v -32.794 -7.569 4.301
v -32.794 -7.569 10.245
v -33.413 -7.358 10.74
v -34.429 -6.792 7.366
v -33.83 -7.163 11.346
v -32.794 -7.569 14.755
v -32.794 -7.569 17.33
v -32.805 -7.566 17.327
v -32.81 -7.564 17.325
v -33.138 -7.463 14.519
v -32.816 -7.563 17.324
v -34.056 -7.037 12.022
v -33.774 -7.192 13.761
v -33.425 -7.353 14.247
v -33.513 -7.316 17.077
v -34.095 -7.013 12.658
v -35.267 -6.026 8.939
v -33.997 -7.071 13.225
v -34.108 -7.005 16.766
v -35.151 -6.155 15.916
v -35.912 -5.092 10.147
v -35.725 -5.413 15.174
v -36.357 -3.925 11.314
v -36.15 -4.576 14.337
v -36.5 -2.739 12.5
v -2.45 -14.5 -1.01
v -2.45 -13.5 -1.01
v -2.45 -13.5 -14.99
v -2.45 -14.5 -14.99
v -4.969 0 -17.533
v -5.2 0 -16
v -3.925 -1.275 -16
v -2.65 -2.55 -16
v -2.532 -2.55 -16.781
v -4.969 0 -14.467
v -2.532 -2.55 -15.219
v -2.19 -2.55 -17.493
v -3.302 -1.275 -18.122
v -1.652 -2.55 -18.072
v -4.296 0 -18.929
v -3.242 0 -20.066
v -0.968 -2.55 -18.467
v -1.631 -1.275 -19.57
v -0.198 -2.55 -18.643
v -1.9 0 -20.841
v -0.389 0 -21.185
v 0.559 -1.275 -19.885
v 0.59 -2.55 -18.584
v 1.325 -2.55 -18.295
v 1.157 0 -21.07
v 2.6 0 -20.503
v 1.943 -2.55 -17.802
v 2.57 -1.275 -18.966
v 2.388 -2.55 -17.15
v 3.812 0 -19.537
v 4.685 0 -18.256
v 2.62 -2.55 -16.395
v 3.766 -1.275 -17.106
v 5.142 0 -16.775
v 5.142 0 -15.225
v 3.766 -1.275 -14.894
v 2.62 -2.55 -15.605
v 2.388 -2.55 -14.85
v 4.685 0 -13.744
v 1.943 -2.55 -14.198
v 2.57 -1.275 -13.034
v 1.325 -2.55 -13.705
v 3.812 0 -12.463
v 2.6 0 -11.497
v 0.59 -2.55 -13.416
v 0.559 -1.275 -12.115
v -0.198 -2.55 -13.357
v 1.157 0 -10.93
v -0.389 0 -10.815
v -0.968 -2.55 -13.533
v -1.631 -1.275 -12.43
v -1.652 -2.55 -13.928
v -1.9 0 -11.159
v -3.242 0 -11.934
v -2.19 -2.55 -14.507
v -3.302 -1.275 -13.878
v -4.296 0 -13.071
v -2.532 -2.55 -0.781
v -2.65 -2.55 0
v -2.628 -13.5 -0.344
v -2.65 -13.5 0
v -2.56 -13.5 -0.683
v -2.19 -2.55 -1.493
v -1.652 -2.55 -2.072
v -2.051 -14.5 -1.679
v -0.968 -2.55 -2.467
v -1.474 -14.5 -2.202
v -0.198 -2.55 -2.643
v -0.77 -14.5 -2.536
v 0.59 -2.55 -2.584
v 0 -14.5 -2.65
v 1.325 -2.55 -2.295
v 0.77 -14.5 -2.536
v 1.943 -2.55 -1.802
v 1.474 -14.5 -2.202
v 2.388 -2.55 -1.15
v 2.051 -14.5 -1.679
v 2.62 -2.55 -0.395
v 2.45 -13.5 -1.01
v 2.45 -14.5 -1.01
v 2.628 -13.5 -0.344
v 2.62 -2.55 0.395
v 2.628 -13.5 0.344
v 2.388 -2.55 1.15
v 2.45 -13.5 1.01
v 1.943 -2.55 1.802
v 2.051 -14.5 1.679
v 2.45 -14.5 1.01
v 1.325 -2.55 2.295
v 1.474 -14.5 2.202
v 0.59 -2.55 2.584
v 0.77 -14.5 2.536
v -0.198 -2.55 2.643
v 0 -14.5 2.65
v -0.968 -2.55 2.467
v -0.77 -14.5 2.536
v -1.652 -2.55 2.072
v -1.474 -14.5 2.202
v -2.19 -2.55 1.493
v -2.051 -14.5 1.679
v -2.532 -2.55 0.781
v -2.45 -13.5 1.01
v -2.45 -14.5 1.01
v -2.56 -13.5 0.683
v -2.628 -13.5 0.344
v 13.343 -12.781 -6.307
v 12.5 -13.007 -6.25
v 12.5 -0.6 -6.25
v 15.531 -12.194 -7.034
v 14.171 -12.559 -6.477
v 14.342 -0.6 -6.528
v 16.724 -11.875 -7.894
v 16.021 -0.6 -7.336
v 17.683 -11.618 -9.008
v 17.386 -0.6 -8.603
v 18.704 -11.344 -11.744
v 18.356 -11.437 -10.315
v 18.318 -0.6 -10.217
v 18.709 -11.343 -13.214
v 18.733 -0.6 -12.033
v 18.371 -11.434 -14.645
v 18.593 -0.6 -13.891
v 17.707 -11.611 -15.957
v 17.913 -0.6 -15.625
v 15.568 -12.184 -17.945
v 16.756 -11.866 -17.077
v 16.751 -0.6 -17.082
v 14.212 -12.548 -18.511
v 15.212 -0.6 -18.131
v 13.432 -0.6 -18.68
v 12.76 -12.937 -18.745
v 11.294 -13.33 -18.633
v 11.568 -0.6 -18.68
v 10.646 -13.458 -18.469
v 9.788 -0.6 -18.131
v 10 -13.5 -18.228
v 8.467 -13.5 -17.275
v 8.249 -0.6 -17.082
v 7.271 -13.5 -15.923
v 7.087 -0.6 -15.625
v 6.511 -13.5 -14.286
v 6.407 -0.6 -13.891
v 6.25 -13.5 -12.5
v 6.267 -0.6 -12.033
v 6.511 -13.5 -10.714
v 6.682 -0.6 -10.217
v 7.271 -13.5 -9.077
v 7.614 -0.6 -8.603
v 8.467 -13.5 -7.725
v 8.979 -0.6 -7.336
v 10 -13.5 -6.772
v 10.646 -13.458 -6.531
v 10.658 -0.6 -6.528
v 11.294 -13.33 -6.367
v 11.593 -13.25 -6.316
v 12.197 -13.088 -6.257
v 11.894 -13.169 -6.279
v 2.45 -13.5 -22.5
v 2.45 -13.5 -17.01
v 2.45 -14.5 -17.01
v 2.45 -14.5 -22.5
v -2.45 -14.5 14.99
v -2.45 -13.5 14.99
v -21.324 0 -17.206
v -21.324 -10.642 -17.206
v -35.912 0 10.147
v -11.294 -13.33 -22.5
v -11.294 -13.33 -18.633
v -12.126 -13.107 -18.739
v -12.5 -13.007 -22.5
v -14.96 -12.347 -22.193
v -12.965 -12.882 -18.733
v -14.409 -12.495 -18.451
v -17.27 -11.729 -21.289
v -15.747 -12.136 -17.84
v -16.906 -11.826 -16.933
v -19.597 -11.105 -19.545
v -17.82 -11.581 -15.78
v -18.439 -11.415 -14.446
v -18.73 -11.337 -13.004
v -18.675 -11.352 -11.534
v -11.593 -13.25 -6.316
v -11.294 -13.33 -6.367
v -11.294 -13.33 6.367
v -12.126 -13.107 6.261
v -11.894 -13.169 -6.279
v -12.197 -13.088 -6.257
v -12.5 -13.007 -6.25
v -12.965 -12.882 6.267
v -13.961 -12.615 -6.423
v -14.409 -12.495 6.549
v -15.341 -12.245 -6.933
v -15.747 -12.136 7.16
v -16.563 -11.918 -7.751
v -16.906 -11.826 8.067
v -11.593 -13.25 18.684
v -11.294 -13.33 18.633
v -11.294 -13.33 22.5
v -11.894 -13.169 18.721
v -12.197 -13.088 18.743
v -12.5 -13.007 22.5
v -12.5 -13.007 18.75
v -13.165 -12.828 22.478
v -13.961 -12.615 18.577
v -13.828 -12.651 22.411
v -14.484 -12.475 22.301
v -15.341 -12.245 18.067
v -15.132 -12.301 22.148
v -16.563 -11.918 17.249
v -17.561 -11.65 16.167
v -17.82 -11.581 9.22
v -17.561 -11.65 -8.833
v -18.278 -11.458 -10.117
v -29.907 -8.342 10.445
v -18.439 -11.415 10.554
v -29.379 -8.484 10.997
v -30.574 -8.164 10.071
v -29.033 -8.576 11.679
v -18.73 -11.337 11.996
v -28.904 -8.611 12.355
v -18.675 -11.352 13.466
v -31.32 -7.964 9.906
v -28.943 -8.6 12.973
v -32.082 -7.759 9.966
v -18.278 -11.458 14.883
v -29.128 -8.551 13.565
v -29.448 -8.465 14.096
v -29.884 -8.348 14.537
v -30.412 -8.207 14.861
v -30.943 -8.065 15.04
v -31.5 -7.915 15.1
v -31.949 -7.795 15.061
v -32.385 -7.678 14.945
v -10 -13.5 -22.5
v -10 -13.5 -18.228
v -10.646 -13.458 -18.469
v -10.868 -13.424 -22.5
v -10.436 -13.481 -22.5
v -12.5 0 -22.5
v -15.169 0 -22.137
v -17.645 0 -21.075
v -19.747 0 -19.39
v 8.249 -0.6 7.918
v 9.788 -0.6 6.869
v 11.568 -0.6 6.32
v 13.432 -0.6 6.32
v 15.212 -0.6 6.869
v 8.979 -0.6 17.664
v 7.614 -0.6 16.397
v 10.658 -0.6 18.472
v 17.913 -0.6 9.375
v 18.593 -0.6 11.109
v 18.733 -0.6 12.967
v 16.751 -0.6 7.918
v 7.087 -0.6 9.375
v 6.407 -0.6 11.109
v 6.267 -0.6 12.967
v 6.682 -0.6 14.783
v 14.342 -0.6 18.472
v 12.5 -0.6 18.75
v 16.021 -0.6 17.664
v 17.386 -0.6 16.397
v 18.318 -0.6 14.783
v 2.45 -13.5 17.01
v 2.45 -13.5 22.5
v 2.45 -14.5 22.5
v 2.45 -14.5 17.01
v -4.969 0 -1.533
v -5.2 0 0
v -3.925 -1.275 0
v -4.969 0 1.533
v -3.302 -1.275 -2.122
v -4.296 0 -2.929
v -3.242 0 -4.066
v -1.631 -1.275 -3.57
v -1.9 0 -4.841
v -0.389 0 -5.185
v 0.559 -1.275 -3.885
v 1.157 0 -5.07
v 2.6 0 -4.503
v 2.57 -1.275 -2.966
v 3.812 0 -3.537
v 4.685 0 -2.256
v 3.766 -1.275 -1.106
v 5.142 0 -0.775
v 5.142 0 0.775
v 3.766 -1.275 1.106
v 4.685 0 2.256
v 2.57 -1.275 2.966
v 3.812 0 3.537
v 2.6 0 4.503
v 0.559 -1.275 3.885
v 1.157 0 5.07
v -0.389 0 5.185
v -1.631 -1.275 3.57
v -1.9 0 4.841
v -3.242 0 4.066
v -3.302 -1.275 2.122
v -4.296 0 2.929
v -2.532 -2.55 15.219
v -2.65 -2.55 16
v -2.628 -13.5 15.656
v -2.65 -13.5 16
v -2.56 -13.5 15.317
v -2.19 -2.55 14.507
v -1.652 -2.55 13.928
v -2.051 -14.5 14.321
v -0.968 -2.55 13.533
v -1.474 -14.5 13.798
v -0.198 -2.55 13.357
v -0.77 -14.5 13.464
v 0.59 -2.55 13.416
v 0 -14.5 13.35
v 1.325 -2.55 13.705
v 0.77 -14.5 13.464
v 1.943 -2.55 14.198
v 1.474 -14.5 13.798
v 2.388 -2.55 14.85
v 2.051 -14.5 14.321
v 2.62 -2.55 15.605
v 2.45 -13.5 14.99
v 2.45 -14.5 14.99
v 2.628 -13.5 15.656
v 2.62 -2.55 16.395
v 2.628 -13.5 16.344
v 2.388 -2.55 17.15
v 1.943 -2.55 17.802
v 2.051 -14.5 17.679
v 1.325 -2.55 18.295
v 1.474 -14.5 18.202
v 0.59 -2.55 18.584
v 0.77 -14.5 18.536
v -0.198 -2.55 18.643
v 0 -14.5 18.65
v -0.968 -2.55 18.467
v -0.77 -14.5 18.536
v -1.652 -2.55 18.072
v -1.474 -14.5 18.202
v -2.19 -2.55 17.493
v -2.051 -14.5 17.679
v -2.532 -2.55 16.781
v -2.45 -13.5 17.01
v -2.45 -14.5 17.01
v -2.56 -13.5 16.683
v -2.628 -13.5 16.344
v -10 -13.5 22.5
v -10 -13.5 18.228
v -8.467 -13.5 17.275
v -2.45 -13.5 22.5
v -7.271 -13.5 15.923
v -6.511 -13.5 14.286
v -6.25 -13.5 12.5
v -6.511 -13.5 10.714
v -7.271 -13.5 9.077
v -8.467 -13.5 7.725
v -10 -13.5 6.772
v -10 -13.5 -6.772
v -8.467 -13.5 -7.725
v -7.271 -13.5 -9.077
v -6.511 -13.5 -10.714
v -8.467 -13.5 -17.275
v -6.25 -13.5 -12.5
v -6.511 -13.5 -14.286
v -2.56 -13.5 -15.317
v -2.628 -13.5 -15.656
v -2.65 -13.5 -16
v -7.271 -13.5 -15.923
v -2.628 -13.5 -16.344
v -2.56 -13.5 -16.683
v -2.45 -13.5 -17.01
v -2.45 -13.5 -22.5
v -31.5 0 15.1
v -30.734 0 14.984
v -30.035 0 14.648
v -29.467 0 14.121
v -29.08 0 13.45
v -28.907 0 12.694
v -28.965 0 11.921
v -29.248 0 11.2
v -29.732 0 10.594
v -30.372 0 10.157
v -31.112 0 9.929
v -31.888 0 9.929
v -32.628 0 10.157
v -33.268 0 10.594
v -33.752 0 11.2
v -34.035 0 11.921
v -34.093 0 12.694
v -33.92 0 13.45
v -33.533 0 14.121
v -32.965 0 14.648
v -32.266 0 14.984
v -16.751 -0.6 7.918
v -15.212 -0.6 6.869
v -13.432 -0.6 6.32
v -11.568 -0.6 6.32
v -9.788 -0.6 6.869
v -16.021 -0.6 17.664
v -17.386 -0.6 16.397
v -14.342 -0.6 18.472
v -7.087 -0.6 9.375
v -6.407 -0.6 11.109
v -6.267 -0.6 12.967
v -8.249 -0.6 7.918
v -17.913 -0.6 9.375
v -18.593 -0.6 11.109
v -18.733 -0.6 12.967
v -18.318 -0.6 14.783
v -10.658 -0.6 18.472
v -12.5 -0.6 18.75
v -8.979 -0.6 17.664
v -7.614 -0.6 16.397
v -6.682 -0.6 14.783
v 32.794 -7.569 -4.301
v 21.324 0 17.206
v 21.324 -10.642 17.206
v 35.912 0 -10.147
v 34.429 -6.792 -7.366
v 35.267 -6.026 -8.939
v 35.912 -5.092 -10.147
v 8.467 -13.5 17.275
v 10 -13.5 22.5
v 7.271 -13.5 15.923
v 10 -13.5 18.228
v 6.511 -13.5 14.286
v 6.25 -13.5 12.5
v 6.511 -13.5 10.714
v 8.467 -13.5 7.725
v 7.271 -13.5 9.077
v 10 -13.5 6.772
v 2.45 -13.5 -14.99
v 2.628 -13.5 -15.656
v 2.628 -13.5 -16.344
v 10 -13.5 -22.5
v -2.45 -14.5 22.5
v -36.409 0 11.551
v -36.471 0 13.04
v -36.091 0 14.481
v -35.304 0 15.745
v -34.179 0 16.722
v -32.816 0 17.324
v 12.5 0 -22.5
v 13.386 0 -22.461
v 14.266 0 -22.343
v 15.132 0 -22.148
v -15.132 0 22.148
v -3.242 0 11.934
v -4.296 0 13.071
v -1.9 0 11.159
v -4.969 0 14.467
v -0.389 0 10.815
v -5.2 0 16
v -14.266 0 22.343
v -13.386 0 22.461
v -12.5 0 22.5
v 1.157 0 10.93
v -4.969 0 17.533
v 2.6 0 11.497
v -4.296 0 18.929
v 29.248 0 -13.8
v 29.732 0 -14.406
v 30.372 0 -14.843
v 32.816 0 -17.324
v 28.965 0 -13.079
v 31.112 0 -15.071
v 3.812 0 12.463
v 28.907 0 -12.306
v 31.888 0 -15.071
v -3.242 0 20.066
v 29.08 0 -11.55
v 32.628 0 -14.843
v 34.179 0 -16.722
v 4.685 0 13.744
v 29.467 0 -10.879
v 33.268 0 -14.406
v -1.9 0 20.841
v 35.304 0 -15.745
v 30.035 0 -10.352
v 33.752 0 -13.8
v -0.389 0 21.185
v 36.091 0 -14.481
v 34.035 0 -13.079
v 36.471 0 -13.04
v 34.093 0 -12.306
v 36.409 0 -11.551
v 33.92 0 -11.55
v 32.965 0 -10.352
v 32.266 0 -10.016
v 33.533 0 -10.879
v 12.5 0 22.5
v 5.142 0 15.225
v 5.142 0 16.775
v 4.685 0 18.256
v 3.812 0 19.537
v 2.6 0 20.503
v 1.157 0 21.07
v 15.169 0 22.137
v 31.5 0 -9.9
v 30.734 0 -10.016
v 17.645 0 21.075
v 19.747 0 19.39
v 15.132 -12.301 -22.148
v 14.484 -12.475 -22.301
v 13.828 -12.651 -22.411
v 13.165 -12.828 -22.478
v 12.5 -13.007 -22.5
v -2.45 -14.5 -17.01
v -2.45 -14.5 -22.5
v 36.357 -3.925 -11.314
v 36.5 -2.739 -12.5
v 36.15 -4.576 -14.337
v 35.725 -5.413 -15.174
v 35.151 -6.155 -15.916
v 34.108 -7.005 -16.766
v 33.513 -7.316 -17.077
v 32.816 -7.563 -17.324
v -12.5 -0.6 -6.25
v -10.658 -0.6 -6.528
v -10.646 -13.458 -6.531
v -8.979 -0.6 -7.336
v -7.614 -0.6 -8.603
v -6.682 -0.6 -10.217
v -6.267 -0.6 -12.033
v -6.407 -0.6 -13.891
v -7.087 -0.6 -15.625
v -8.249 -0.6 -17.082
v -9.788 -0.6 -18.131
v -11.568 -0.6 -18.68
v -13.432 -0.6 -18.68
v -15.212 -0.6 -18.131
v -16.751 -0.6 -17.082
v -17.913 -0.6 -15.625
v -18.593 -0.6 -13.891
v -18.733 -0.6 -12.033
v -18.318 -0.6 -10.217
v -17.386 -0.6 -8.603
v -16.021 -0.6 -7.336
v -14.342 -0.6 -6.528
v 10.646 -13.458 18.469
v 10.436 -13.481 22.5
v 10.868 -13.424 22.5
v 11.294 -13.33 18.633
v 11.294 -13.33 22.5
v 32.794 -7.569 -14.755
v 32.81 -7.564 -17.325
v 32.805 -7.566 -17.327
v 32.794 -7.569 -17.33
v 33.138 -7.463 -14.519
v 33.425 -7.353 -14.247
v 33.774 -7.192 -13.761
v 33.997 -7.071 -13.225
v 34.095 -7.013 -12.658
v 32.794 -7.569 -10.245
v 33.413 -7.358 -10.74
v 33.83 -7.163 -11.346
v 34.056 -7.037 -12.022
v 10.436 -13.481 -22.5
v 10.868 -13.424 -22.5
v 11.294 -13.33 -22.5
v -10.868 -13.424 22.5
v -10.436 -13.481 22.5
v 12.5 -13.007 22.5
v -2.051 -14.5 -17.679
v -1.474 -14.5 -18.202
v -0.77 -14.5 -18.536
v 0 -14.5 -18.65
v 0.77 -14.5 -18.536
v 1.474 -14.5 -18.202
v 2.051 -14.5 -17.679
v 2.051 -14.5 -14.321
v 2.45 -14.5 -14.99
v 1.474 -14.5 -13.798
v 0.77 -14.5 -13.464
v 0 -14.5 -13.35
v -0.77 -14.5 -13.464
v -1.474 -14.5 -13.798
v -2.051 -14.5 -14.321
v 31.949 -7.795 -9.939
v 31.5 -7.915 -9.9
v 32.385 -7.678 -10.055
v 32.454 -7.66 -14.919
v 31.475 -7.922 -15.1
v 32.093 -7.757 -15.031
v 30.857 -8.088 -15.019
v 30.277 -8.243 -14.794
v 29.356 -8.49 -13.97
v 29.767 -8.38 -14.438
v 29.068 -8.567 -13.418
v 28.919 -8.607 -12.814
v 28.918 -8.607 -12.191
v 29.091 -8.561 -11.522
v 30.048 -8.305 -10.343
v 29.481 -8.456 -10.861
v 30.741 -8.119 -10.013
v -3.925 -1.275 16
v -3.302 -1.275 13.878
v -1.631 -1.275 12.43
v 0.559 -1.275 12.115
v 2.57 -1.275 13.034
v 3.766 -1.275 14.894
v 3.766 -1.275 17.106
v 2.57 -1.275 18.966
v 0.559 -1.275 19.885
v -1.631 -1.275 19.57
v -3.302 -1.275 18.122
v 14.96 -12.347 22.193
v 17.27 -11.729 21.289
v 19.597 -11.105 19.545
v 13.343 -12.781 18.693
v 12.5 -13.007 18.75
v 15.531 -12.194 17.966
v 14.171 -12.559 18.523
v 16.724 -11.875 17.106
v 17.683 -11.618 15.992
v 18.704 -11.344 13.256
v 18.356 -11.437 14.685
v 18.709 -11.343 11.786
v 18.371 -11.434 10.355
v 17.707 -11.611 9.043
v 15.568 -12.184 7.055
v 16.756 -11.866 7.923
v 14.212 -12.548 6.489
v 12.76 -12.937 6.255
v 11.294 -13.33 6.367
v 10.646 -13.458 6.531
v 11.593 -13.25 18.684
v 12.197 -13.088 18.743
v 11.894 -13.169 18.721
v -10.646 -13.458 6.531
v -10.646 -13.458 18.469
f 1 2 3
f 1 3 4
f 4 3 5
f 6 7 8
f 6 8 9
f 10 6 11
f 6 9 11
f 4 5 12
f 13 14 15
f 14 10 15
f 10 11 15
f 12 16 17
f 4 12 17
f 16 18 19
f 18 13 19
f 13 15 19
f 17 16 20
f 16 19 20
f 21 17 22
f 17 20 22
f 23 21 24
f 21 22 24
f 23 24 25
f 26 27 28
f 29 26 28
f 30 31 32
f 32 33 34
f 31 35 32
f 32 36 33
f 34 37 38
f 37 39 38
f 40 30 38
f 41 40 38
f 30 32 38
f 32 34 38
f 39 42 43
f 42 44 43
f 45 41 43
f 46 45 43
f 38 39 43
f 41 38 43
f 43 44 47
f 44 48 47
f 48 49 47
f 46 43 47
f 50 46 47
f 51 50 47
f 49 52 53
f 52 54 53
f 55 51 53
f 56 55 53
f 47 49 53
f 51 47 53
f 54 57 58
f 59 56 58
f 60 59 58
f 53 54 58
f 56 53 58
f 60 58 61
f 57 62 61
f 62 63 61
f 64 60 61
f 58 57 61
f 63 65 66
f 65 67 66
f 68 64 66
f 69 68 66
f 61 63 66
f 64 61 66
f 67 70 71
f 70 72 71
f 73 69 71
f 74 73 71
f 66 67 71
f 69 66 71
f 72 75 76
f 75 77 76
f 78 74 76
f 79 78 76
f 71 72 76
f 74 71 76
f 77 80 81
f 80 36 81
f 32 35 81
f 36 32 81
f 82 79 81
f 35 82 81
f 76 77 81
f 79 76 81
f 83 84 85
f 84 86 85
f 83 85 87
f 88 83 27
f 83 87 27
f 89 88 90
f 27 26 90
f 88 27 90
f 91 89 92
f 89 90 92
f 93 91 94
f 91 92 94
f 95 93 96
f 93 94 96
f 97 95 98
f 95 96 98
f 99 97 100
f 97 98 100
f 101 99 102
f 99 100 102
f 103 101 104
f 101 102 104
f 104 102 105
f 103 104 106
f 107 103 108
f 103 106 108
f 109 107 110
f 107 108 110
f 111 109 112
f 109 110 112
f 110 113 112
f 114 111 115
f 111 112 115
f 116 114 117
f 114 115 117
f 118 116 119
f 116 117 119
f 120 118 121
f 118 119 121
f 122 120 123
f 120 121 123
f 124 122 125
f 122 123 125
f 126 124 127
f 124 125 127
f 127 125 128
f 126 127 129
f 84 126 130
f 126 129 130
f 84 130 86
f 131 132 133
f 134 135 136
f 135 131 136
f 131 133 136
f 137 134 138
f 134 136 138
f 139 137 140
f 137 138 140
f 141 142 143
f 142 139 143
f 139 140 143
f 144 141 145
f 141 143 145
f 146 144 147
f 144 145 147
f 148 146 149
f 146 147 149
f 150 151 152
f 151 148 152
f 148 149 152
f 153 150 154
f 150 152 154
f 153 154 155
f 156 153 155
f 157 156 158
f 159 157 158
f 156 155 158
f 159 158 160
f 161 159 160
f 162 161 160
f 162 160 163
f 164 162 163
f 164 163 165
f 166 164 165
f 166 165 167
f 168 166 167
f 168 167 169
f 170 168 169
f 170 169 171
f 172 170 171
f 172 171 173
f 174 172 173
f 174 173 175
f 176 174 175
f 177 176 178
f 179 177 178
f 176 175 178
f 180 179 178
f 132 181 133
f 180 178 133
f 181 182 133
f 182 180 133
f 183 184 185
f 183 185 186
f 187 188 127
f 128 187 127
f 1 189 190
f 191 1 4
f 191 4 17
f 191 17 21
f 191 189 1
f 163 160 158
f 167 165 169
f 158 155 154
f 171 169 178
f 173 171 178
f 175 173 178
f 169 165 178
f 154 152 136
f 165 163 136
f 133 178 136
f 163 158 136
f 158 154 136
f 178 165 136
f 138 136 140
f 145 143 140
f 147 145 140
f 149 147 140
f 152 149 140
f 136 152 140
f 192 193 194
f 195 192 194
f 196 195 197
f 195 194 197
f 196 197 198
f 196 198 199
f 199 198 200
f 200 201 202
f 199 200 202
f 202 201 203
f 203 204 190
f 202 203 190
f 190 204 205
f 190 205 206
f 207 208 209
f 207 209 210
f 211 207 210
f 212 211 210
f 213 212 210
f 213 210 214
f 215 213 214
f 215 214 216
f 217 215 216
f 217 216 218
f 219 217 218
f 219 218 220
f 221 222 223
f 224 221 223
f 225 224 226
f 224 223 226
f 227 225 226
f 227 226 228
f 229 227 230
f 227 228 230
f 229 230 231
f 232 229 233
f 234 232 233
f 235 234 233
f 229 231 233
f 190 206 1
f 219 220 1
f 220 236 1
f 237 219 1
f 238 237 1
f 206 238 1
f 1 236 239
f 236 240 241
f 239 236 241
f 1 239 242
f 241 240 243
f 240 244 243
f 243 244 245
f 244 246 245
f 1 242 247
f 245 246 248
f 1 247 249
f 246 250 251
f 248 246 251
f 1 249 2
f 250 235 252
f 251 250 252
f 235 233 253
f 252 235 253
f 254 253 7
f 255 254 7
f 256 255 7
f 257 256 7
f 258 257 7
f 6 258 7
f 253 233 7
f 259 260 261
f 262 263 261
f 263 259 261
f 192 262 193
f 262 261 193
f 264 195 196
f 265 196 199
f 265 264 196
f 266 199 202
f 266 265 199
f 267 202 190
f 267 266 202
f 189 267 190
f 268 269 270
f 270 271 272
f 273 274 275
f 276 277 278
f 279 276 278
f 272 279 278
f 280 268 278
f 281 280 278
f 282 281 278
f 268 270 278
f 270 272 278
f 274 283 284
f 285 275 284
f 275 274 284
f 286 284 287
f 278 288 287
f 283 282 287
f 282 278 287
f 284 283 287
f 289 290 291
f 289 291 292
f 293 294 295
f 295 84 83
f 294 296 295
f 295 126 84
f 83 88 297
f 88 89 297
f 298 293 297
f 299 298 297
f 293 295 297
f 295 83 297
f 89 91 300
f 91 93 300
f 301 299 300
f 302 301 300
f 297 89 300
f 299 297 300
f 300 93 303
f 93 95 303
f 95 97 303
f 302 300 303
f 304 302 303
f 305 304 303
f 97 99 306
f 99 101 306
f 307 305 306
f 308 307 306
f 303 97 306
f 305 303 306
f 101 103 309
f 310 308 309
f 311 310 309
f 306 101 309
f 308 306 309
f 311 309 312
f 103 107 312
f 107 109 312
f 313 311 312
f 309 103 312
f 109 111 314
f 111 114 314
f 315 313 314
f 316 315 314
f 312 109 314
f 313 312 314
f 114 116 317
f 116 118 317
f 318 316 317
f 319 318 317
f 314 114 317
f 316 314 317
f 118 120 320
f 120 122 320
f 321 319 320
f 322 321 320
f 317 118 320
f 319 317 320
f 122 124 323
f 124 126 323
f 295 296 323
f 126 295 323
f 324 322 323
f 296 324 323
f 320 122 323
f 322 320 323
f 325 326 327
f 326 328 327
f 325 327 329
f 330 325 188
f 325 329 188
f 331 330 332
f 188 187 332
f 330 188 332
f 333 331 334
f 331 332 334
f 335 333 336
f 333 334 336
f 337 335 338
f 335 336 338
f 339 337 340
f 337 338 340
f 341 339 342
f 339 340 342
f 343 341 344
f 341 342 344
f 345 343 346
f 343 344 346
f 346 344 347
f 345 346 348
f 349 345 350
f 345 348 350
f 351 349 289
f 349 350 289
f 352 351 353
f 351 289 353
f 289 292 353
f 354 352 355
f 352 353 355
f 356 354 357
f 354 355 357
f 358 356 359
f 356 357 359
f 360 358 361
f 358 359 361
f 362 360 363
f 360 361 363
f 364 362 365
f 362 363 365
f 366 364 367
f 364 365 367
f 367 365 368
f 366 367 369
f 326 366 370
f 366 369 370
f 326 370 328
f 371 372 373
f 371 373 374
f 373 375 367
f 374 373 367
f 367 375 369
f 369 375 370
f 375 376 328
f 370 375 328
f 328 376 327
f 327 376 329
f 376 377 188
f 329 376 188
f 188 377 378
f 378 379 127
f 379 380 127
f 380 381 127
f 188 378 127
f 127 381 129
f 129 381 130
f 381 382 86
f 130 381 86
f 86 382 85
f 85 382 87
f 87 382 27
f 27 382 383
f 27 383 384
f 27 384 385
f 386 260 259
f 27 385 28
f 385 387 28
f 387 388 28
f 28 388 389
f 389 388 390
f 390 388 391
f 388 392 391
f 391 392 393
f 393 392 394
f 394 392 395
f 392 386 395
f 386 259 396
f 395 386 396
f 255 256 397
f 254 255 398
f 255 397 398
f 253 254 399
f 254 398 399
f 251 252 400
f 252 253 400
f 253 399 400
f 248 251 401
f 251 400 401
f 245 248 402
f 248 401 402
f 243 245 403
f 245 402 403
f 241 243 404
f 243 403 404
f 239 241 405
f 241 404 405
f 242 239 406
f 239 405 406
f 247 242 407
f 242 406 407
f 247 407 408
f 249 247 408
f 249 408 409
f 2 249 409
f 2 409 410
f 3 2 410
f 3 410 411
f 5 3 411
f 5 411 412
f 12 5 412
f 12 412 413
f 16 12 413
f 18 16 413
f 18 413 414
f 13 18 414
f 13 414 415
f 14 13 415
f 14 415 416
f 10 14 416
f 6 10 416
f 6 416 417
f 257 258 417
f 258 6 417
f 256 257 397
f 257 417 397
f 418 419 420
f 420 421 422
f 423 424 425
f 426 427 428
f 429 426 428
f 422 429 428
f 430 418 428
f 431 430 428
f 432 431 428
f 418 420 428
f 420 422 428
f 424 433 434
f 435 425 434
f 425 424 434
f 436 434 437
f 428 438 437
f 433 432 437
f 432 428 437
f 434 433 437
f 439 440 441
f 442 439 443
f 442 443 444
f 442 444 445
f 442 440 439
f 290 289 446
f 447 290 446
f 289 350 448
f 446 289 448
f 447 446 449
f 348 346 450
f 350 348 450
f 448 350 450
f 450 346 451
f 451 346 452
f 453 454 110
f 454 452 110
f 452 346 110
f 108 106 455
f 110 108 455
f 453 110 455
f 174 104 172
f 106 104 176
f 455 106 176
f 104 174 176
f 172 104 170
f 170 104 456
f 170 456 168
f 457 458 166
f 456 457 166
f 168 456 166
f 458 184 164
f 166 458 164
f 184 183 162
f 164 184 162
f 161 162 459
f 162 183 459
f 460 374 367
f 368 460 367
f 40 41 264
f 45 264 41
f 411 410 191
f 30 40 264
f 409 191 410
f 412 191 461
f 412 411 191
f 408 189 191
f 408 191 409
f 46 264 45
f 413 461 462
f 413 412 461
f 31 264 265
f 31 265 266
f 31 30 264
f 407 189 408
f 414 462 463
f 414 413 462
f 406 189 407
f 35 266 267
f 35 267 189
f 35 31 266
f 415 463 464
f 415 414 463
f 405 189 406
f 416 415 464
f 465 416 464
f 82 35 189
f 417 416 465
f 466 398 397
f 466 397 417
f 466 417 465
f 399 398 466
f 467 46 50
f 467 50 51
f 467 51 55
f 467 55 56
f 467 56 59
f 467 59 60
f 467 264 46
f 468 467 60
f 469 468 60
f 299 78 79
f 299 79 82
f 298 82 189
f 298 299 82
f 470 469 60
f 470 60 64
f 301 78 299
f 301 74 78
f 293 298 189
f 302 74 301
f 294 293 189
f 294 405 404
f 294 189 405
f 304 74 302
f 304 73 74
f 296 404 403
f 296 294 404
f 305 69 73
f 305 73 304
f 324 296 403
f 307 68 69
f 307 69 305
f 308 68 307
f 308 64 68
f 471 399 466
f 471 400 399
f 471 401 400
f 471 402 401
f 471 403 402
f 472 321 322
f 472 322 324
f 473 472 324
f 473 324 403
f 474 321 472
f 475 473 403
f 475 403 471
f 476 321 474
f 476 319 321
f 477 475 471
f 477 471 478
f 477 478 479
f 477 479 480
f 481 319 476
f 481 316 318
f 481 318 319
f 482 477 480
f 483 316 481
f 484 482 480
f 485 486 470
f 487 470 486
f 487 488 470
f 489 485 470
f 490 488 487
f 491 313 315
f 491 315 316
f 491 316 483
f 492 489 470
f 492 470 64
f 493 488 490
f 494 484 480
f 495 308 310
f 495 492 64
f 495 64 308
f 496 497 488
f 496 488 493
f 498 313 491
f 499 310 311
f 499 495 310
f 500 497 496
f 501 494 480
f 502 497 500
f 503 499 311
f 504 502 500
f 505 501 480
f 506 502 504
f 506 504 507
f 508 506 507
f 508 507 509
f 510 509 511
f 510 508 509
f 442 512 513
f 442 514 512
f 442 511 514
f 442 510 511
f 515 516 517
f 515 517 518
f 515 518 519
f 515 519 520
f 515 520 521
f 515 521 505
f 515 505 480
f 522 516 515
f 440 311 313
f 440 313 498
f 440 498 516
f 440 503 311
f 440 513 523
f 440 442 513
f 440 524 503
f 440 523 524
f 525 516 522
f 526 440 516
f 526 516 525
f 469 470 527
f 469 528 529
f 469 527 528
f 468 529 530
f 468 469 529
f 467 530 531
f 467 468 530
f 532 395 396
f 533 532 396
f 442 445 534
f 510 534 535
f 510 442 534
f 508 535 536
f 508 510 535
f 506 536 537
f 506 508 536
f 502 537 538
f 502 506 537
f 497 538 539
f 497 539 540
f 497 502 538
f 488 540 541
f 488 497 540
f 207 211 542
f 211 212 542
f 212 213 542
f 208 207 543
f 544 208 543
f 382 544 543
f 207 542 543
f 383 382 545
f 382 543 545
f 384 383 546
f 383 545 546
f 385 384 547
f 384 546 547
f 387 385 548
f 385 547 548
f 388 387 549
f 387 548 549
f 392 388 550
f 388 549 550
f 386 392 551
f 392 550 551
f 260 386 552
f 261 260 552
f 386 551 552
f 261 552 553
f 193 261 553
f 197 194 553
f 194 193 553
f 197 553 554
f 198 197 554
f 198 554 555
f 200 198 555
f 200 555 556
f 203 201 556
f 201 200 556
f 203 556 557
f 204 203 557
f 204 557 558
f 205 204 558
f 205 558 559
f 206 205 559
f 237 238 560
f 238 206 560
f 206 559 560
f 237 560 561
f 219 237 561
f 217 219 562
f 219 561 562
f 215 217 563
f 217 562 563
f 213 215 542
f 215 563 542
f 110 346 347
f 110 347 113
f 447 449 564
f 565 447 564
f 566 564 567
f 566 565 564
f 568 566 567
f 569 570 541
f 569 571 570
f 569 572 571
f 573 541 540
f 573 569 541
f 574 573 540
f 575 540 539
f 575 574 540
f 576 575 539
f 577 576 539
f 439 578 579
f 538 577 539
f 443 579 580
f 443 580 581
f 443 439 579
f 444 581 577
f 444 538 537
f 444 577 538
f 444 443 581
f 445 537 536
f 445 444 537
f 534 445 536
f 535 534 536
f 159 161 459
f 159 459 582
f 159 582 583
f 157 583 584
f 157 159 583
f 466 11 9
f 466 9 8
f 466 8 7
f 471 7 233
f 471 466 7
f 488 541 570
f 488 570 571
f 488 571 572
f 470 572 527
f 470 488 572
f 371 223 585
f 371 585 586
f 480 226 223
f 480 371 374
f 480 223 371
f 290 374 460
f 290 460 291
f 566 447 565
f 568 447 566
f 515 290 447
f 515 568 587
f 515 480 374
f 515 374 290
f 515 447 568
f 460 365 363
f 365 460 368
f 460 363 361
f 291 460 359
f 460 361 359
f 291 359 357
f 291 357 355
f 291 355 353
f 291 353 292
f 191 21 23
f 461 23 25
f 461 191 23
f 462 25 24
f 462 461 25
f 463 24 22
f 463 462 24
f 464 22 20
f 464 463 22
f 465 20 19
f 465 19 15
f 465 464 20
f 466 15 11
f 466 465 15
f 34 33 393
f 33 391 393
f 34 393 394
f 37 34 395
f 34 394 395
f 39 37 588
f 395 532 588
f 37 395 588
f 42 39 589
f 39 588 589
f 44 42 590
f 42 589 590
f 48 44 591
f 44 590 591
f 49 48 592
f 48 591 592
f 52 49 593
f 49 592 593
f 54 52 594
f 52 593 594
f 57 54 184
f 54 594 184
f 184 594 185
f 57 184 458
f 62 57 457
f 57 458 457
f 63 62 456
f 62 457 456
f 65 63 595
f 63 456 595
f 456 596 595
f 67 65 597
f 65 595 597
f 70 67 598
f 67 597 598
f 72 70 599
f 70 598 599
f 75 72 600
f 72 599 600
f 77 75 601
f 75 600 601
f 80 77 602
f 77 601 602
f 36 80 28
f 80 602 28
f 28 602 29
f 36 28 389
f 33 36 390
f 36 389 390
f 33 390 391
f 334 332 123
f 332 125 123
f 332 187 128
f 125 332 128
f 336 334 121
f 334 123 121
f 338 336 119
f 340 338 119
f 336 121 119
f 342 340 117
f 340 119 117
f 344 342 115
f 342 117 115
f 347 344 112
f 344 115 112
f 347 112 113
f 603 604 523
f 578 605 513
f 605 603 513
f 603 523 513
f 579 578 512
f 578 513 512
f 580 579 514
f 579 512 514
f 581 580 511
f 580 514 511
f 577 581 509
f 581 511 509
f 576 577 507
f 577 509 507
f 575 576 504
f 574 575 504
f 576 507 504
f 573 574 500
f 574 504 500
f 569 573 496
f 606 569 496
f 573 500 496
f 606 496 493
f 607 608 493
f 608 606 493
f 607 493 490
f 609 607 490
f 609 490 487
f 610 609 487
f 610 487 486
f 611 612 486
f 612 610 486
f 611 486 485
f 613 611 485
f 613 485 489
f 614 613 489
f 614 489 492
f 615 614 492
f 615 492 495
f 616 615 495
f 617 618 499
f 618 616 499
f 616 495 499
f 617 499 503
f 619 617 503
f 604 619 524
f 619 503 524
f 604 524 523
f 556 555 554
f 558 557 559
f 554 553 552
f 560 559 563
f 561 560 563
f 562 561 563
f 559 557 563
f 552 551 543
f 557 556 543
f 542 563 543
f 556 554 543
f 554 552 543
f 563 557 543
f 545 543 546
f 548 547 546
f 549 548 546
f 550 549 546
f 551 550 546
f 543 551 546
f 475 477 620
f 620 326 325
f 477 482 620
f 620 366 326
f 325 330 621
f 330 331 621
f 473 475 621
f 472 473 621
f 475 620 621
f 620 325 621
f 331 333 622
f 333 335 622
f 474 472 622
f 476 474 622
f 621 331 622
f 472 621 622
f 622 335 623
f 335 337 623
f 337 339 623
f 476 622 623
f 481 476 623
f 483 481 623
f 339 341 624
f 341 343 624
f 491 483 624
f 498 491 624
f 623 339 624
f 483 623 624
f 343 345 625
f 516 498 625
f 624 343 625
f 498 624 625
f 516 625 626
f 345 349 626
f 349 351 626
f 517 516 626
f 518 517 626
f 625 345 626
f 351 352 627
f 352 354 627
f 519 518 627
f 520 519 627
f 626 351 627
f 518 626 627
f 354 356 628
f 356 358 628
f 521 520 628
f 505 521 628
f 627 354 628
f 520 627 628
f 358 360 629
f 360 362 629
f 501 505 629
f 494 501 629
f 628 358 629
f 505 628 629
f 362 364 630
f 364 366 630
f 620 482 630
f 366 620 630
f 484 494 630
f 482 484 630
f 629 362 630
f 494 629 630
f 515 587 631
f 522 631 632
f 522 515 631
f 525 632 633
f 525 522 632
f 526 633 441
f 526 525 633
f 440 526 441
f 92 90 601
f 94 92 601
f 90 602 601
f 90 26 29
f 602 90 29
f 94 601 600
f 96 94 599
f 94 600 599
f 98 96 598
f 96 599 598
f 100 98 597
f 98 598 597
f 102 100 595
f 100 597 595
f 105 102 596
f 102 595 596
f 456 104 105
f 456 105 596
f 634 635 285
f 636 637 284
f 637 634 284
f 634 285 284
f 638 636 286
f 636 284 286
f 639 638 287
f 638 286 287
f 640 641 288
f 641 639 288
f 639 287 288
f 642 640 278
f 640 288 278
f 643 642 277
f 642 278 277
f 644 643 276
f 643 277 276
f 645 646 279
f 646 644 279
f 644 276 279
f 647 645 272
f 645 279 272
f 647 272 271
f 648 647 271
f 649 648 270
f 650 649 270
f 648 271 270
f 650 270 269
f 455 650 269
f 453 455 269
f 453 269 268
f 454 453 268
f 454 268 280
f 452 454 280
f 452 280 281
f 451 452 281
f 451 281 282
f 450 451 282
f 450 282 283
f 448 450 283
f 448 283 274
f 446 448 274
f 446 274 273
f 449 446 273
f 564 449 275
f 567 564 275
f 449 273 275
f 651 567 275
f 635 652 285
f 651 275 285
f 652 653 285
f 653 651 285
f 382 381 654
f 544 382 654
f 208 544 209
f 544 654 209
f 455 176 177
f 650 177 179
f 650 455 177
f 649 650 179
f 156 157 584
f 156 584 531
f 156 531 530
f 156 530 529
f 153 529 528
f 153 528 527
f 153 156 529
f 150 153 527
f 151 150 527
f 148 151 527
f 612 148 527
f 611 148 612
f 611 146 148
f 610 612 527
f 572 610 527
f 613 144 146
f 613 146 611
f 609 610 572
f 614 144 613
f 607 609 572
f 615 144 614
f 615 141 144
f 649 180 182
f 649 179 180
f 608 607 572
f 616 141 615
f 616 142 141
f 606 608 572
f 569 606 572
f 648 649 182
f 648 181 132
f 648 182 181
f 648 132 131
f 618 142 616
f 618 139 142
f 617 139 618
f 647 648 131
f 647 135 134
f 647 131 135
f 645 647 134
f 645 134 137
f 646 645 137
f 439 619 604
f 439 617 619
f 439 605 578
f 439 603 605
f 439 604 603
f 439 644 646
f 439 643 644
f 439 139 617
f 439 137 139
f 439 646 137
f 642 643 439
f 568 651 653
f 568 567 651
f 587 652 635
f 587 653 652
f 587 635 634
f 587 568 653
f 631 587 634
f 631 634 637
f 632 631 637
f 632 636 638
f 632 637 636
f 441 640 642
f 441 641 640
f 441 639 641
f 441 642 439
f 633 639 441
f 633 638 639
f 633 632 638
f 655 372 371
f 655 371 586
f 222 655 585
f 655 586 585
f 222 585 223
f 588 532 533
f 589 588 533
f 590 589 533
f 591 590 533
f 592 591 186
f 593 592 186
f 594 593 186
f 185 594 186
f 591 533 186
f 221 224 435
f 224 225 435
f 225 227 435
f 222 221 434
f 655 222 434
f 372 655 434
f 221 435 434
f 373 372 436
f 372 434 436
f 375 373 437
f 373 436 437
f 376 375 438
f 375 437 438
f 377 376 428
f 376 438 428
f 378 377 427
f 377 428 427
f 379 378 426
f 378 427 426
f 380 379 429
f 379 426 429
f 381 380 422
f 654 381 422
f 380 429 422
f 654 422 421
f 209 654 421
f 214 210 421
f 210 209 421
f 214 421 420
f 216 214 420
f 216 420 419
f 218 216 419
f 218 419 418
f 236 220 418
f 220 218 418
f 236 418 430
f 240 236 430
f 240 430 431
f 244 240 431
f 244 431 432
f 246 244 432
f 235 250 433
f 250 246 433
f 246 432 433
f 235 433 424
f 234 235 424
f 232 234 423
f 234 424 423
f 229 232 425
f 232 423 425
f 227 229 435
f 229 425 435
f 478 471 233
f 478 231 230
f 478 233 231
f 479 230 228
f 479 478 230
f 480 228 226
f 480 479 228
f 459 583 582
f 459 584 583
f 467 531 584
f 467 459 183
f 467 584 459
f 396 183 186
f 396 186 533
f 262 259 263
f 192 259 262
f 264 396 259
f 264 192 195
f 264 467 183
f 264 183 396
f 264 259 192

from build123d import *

# Parameters (mm, degrees)
SKETCH1_R                                       = 2.6
SKETCH1_R_2                                     = 6.25
SKETCH1_W                                       = 4.9
SKETCH1_H                                       = 45
BOSS_EXTRUDE1_DEPTH                             = 13.5
SKETCH1_3_R                                     = 6.25
BOSS_EXTRUDE2_DEPTH                             = 0.6
BOSS_EXTRUDE3_START                             = -13.5
SKETCH1_4_W                                     = 4.9
SKETCH1_4_H                                     = 45
BOSS_EXTRUDE3_DEPTH                             = 1
CSK_FOR_M5_FLAT_HEAD_MACHINE_SCREW2_D           = 5.3
CSK_FOR_M5_FLAT_HEAD_MACHINE_SCREW2_CSINK_D     = 10.4
CSK_FOR_M5_FLAT_HEAD_MACHINE_SCREW2_CSINK_ANGLE = 90
CUT_EXTRUDE1_DEPTH                              = 46.263119645


with BuildPart() as part:
    # Sketch1 → Boss-Extrude1 (new body)
    # profile 1 of 3: a face of its own
    with BuildSketch(Plane(origin=(0, 0, 0), x_dir=(1, 0, 0), z_dir=(0, 1, 0))):
        with BuildLine():
            Line((-2.45, 22.5), (-12.5, 22.5))
            ThreePointArc((-12.5, 22.5), (-17.644957554, 21.074929257), (-21.323529412, 17.205882353))
            Line((-21.323529412, 17.205882353), (-35.911764706, -10.147058824))
            ThreePointArc((-35.911764706, -10.147058824), (-36.091023102, -14.480531969), (-32.815789474, -17.323763889))
            Line((-32.815789474, -17.323763889), (-15.131578947, -22.147527779))
            ThreePointArc((-15.131578947, -22.147527779), (-13.827539493, -22.411490246), (-12.5, -22.5))
            Line((-12.5, -22.5), (-2.45, -22.5))
            Line((-2.45, -22.5), (-2.45, 22.5))
        make_face()
        with Locations(Location((-31.5, -12.5, 0), (0, 0, 270))):
            Circle(SKETCH1_R, mode=Mode.SUBTRACT)
        with Locations(Location((-12.5, -12.5, 0), (0, 0, 270))):
            Circle(SKETCH1_R_2, mode=Mode.SUBTRACT)
        with Locations(Location((-12.5, 12.5, 0), (0, 0, 270))):
            Circle(SKETCH1_R_2, mode=Mode.SUBTRACT)
    # profile 2 of 3: a face of its own
    with BuildSketch(Plane(origin=(0, 0, 0), x_dir=(1, 0, 0), z_dir=(0, 1, 0))):
        Rectangle(SKETCH1_W, SKETCH1_H)
    # profile 3 of 3: a face of its own
    with BuildSketch(Plane(origin=(0, 0, 0), x_dir=(1, 0, 0), z_dir=(0, 1, 0))):
        with BuildLine():
            Line((12.5, 22.5), (2.45, 22.5))
            Line((2.45, 22.5), (2.45, -22.5))
            Line((2.45, -22.5), (12.5, -22.5))
            ThreePointArc((12.5, -22.5), (17.644957554, -21.074929257), (21.323529412, -17.205882353))
            Line((21.323529412, -17.205882353), (35.911764706, 10.147058824))
            ThreePointArc((35.911764706, 10.147058824), (36.091023102, 14.480531969), (32.815789474, 17.323763889))
            Line((32.815789474, 17.323763889), (15.131578947, 22.147527779))
            ThreePointArc((15.131578947, 22.147527779), (13.827539493, 22.411490246), (12.5, 22.5))
        make_face()
        with Locations(Location((12.5, -12.5, 0), (0, 0, 270))):
            Circle(SKETCH1_R_2, mode=Mode.SUBTRACT)
        with Locations(Location((12.5, 12.5, 0), (0, 0, 270))):
            Circle(SKETCH1_R_2, mode=Mode.SUBTRACT)
        with Locations(Location((31.5, 12.5, 0), (0, 0, 270))):
            Circle(SKETCH1_R, mode=Mode.SUBTRACT)
    extrude(amount=-BOSS_EXTRUDE1_DEPTH)

    # Sketch1<3> → Boss-Extrude2 (add)
    with BuildSketch(Plane(origin=(0, 0, 0), x_dir=(1, 0, 0), z_dir=(0, 1, 0))):
        with Locations(Location((-12.5, 12.5, 0), (0, 0, 270))):
            Circle(SKETCH1_3_R)
        with Locations(Location((12.5, 12.5, 0), (0, 0, 270))):
            Circle(SKETCH1_3_R)
        with Locations(Location((12.5, -12.5, 0), (0, 0, 270))):
            Circle(SKETCH1_3_R)
        with Locations(Location((-12.5, -12.5, 0), (0, 0, 270))):
            Circle(SKETCH1_3_R)
    extrude(amount=-BOSS_EXTRUDE2_DEPTH)

    # Sketch1<4> → Boss-Extrude3 (add)
    with BuildSketch(Plane(origin=(0, 0, 0), x_dir=(1, 0, 0), z_dir=(0, 1, 0)).offset(BOSS_EXTRUDE3_START)):
        Rectangle(SKETCH1_4_W, SKETCH1_4_H)
    extrude(amount=-BOSS_EXTRUDE3_DEPTH)

    # CSK for M5 Flat Head Machine Screw2 (through all)
    with Locations(Plane(origin=(0, 0, 0), x_dir=(1, 0, 0), z_dir=(0, 1, 0))):
        with Locations((0, 16), (0, 0), (0, -16)):
            CounterSinkHole(CSK_FOR_M5_FLAT_HEAD_MACHINE_SCREW2_D / 2, CSK_FOR_M5_FLAT_HEAD_MACHINE_SCREW2_CSINK_D / 2, counter_sink_angle=CSK_FOR_M5_FLAT_HEAD_MACHINE_SCREW2_CSINK_ANGLE)

    # Sketch8 → Cut-Extrude1 (cut, symmetric)
    with BuildSketch(Plane.XY):
        with BuildLine():
            ThreePointArc((32.794095226, -7.568721494), (35.466766701, -5.782899508), (36.5, -2.739092363))
            Line((36.5, -2.739092363), (36.5, -13.5))
            Line((36.5, -13.5), (10, -13.5))
            ThreePointArc((10, -13.5), (10.652630961, -13.457224307), (11.294095226, -13.329629131))
            Line((11.294095226, -13.329629131), (32.794095226, -7.568721494))
        make_face()
    cut_extrude1 = extrude(amount=CUT_EXTRUDE1_DEPTH, both=True, mode=Mode.SUBTRACT)

    # Mirror1: Cut-Extrude1 across plane
    add(cut_extrude1.mirror(Plane(origin=(0, 0, 0), x_dir=(0, 0, 1), z_dir=(1, 0, 0))), mode=Mode.SUBTRACT)


solid = part.part
